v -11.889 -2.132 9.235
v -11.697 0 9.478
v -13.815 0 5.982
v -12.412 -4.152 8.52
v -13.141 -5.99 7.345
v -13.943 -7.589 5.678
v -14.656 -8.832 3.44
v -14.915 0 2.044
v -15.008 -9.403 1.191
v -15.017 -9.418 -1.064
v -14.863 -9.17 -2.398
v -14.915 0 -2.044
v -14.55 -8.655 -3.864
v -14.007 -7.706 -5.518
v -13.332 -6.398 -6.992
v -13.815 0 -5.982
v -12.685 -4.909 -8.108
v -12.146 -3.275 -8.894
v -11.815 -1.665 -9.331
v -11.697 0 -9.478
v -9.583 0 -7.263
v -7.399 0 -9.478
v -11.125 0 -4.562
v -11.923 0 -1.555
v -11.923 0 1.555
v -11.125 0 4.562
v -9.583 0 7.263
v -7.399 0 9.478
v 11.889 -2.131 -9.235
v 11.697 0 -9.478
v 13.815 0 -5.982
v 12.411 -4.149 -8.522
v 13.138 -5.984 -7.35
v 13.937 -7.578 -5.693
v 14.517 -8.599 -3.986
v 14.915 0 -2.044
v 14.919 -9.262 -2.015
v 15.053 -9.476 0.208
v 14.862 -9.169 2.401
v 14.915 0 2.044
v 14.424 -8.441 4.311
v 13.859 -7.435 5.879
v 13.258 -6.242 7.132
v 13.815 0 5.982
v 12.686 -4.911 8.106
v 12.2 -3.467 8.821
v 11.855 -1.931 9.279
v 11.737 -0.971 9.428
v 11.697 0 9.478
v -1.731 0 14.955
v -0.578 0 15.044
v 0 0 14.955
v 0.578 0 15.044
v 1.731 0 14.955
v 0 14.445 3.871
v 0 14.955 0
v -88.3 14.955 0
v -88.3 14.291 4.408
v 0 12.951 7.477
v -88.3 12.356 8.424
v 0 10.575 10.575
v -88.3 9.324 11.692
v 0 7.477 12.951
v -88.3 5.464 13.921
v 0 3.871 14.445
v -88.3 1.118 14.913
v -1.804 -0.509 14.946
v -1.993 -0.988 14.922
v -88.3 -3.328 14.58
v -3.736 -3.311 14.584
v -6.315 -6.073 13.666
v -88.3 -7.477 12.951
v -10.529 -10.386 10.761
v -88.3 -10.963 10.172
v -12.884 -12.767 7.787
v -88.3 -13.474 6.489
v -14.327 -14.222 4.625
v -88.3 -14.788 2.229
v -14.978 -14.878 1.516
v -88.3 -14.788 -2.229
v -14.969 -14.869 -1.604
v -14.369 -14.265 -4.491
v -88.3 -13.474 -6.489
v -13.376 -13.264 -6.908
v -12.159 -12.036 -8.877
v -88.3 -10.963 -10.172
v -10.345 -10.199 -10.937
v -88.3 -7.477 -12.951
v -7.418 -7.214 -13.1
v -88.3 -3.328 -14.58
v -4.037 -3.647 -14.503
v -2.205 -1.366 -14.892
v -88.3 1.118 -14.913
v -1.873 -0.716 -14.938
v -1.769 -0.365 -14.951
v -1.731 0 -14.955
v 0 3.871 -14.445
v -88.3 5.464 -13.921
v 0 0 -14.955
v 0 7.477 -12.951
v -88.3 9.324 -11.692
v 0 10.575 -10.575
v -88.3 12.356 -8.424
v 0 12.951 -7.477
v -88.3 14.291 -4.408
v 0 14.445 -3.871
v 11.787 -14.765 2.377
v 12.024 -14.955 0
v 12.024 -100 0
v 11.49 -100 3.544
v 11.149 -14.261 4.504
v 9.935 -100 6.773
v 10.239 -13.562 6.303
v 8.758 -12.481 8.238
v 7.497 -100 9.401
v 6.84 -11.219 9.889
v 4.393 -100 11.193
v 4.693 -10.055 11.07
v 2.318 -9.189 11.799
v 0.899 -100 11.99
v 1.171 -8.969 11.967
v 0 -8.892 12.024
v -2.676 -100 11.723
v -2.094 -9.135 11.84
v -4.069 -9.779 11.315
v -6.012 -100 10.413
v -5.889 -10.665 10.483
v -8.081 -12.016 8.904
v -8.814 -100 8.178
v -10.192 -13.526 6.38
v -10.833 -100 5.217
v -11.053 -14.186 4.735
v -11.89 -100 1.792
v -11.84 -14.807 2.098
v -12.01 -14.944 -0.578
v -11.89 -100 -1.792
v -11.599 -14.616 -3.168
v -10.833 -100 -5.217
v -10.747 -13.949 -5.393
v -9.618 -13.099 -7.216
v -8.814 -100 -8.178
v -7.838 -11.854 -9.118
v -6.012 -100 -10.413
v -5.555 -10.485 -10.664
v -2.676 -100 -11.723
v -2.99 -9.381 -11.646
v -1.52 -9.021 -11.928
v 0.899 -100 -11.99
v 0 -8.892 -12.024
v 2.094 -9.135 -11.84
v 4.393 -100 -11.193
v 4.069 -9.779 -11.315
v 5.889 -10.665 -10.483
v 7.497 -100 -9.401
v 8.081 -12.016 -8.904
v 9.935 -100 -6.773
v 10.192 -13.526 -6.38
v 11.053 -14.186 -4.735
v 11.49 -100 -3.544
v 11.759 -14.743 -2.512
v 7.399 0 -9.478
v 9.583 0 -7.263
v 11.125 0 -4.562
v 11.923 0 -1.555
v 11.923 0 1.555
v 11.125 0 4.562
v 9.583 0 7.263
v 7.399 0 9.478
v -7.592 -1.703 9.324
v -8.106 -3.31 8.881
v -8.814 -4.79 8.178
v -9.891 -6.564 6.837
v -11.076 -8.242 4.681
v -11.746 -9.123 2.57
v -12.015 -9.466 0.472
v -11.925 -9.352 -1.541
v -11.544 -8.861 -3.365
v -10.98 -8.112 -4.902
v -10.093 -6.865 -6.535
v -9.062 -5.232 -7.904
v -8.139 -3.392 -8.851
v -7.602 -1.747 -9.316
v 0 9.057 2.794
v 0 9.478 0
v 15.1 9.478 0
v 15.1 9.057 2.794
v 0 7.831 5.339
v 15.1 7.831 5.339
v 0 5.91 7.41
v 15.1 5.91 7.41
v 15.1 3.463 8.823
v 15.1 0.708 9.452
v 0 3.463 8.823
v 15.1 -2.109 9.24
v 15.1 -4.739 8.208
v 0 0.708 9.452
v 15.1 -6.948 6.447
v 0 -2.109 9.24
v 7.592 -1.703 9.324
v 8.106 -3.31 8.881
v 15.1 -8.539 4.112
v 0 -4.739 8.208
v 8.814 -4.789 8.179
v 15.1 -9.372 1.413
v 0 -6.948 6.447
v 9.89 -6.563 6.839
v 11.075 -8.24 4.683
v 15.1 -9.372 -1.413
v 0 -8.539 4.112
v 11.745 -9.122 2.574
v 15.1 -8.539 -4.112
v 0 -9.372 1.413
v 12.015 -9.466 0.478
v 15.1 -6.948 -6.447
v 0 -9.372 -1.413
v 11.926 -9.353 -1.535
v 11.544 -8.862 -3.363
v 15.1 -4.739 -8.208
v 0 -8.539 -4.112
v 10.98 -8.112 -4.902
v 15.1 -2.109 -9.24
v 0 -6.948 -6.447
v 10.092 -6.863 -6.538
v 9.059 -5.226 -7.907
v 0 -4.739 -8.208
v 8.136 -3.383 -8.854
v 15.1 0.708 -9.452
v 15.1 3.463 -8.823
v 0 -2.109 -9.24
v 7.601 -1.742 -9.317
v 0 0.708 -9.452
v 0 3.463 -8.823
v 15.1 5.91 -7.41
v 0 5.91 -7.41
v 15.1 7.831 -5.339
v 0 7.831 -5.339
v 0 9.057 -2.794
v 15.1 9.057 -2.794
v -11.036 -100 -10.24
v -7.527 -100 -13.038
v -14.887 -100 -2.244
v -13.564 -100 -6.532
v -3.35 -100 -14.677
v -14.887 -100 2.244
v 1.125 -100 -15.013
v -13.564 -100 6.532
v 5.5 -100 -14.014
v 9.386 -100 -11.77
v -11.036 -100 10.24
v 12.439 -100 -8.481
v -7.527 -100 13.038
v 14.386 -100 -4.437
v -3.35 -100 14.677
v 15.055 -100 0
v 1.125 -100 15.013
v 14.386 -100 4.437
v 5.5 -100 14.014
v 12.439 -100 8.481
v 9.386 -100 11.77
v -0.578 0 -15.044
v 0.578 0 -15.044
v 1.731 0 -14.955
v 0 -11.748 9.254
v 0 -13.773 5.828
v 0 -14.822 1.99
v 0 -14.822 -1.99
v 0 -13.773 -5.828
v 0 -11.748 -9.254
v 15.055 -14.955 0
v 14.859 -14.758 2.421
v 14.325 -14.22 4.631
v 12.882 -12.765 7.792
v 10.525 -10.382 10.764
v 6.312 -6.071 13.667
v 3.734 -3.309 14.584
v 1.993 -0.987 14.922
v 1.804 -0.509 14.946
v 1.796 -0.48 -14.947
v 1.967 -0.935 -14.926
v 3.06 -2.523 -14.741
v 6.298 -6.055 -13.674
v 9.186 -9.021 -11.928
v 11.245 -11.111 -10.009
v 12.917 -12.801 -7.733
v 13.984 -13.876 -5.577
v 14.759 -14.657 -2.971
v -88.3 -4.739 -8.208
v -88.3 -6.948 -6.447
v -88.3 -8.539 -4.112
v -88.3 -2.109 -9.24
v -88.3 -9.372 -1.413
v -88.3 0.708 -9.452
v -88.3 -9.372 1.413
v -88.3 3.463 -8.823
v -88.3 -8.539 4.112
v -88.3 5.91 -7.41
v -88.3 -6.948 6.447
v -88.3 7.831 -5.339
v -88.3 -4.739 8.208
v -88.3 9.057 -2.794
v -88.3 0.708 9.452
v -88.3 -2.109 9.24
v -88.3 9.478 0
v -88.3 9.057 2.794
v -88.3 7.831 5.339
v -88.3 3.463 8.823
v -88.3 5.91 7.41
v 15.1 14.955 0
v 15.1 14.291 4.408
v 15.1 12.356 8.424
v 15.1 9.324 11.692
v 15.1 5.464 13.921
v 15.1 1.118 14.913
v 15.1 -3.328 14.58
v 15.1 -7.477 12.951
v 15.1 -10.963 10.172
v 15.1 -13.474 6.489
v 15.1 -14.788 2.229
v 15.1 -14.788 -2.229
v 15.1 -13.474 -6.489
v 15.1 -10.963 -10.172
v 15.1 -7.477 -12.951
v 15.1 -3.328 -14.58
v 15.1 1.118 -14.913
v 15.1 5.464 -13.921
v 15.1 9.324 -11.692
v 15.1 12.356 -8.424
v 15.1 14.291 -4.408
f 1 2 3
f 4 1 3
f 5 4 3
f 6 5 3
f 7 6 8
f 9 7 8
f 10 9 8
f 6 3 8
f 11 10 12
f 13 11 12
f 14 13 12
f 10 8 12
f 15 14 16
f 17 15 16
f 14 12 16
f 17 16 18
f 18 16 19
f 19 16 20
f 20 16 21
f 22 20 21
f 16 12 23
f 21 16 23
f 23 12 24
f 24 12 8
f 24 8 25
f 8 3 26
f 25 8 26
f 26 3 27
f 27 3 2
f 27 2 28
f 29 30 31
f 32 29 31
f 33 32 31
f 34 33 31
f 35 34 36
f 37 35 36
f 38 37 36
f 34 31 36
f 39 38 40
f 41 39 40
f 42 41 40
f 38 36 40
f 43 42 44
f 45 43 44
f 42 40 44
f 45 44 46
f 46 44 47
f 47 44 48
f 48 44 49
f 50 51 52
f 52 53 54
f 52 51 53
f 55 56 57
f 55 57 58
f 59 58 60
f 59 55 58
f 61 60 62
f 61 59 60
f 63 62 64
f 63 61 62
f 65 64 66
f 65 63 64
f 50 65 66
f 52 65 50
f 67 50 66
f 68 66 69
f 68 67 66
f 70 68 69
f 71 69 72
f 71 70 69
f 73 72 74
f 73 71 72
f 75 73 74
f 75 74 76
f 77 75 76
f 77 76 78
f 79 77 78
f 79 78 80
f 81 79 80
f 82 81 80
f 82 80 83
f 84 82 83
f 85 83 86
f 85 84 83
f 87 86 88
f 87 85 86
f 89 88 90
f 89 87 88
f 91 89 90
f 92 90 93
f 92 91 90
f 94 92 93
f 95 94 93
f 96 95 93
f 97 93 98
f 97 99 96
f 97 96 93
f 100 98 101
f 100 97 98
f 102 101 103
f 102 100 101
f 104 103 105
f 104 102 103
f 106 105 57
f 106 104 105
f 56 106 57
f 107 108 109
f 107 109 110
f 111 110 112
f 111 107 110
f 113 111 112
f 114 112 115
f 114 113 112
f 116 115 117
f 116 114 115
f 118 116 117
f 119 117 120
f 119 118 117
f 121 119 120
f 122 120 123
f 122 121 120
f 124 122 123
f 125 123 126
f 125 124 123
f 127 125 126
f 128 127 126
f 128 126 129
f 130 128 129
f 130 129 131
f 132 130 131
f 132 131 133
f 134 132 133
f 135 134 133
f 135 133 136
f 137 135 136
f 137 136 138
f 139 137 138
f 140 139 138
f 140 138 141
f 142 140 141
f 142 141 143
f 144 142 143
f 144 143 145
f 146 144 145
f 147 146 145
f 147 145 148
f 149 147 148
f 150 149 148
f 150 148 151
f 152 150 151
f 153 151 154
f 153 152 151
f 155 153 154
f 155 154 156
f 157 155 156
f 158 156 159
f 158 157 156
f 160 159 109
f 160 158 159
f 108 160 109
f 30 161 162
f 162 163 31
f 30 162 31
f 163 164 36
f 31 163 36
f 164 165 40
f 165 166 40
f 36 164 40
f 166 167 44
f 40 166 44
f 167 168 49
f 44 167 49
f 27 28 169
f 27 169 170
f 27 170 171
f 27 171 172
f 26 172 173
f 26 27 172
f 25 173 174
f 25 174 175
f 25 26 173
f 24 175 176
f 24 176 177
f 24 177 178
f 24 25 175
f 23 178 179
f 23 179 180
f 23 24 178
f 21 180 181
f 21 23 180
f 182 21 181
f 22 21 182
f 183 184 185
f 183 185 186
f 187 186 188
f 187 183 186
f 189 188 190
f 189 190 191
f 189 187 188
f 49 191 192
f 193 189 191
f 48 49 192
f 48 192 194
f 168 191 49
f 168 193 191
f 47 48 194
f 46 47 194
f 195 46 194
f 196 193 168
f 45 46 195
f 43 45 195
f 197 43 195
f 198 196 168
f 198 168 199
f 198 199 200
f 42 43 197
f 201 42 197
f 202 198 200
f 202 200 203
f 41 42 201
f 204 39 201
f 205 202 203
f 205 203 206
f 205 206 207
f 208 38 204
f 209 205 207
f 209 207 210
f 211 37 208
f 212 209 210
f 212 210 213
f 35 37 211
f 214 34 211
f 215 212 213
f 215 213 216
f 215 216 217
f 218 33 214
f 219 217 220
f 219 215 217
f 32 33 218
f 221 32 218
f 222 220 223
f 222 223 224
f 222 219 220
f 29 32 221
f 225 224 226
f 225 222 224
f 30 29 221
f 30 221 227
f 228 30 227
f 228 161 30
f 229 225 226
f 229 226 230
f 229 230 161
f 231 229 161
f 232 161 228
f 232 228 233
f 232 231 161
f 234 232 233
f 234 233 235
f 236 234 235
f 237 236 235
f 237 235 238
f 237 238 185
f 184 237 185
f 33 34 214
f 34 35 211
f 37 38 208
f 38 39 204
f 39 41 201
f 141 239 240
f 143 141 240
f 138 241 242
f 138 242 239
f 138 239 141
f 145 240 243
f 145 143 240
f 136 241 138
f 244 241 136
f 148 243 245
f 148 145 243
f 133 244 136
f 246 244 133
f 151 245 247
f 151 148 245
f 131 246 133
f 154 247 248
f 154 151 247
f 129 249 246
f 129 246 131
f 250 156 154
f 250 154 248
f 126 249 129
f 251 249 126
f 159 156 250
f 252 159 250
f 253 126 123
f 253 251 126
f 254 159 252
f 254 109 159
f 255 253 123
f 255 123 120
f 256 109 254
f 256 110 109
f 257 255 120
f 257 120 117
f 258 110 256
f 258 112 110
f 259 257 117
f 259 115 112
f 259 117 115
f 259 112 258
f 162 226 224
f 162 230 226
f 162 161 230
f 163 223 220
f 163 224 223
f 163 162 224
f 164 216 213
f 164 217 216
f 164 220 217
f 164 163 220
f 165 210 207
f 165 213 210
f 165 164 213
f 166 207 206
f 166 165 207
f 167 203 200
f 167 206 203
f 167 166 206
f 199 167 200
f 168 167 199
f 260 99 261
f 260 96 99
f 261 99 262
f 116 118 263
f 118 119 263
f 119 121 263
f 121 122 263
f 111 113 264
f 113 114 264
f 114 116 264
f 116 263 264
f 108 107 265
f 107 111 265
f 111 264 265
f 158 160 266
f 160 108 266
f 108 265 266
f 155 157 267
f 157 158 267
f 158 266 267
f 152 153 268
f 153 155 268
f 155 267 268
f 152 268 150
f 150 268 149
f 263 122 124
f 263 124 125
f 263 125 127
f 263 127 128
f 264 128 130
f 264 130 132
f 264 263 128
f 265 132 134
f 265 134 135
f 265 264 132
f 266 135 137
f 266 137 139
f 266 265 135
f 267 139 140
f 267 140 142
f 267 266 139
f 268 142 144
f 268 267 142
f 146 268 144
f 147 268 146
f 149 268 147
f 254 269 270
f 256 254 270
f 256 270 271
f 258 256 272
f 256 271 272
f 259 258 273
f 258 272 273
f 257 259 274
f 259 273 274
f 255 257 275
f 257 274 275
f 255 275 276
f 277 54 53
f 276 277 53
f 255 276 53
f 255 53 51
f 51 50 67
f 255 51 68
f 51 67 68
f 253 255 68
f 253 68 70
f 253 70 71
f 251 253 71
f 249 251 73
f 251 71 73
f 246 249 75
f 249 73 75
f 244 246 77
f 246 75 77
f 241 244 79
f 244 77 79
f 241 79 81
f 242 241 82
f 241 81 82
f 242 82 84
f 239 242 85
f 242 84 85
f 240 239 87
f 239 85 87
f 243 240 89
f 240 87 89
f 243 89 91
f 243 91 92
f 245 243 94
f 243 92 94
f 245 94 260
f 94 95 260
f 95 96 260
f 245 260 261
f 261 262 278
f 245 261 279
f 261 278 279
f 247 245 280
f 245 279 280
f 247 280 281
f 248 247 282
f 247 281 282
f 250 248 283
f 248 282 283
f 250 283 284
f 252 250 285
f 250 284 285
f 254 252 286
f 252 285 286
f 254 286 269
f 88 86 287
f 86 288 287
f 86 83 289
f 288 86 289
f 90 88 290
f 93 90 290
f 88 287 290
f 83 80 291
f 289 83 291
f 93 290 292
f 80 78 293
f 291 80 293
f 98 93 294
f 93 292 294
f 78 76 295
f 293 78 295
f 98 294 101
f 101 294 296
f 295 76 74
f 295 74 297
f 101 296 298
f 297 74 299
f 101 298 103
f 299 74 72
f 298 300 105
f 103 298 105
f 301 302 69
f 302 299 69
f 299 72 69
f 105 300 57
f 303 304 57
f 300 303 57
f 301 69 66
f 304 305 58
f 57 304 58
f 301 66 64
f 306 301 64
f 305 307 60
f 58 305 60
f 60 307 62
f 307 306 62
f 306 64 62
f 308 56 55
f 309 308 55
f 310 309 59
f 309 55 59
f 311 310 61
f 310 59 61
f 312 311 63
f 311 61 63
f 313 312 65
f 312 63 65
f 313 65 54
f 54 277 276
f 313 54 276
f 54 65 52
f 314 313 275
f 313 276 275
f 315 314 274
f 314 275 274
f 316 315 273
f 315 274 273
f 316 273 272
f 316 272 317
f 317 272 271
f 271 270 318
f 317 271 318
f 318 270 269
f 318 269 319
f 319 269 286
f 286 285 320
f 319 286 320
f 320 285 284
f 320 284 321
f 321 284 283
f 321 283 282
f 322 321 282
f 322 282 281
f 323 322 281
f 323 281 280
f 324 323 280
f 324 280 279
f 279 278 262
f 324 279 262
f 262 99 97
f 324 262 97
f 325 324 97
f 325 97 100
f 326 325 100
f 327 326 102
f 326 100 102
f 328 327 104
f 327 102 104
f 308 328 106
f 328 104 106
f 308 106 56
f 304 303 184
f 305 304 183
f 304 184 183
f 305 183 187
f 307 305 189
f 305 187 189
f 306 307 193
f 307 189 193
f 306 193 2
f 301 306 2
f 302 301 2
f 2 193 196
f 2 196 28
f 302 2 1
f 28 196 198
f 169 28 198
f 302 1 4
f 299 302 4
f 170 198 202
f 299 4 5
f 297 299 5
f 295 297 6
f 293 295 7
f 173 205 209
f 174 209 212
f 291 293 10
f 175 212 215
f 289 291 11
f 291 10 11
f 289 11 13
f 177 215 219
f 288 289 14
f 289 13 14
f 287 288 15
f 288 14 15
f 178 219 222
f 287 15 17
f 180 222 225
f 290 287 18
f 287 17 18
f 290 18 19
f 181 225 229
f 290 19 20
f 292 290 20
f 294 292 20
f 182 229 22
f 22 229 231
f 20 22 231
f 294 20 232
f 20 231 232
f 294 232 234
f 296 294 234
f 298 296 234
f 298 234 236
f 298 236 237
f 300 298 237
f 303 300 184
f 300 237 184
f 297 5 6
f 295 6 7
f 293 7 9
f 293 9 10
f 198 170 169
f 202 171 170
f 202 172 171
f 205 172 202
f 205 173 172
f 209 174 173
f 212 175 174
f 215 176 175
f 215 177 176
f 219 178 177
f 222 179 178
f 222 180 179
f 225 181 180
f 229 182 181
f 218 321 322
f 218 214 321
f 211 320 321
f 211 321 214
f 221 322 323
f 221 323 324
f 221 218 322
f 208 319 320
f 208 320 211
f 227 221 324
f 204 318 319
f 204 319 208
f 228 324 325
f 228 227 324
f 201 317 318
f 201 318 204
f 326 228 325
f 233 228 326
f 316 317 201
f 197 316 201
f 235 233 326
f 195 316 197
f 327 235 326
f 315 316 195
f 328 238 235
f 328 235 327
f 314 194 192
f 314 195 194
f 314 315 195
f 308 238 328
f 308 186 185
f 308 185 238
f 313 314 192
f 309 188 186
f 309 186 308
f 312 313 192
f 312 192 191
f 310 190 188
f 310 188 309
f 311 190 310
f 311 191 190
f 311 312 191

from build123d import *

# Parameters (mm, degrees)
F0_R     = 15.054767
F0_R_2   = 12.024096
F1_DEPTH = 100
F2_R     = 14.954944
F2_R_2   = 9.478125
F3_DEPTH = 15.1
F4_DEPTH = 88.3


with BuildPart() as f1:
    # F0 (on Front) → F1 (new body)
    with BuildSketch(Plane.XZ):
        Circle(F0_R)
        Circle(F0_R_2, mode=Mode.SUBTRACT)
    extrude(amount=F1_DEPTH)

    # F2 (on Right) → F3 (join)
    with BuildSketch(Plane.YZ):
        Circle(F2_R)
        Circle(F2_R_2, mode=Mode.SUBTRACT)
    extrude(amount=F3_DEPTH)

    # F2 (on Right) → F4 (join)
    with BuildSketch(Plane.YZ):
        Circle(F2_R)
        Circle(F2_R_2, mode=Mode.SUBTRACT)
    extrude(amount=-F4_DEPTH)


solid = f1.part
